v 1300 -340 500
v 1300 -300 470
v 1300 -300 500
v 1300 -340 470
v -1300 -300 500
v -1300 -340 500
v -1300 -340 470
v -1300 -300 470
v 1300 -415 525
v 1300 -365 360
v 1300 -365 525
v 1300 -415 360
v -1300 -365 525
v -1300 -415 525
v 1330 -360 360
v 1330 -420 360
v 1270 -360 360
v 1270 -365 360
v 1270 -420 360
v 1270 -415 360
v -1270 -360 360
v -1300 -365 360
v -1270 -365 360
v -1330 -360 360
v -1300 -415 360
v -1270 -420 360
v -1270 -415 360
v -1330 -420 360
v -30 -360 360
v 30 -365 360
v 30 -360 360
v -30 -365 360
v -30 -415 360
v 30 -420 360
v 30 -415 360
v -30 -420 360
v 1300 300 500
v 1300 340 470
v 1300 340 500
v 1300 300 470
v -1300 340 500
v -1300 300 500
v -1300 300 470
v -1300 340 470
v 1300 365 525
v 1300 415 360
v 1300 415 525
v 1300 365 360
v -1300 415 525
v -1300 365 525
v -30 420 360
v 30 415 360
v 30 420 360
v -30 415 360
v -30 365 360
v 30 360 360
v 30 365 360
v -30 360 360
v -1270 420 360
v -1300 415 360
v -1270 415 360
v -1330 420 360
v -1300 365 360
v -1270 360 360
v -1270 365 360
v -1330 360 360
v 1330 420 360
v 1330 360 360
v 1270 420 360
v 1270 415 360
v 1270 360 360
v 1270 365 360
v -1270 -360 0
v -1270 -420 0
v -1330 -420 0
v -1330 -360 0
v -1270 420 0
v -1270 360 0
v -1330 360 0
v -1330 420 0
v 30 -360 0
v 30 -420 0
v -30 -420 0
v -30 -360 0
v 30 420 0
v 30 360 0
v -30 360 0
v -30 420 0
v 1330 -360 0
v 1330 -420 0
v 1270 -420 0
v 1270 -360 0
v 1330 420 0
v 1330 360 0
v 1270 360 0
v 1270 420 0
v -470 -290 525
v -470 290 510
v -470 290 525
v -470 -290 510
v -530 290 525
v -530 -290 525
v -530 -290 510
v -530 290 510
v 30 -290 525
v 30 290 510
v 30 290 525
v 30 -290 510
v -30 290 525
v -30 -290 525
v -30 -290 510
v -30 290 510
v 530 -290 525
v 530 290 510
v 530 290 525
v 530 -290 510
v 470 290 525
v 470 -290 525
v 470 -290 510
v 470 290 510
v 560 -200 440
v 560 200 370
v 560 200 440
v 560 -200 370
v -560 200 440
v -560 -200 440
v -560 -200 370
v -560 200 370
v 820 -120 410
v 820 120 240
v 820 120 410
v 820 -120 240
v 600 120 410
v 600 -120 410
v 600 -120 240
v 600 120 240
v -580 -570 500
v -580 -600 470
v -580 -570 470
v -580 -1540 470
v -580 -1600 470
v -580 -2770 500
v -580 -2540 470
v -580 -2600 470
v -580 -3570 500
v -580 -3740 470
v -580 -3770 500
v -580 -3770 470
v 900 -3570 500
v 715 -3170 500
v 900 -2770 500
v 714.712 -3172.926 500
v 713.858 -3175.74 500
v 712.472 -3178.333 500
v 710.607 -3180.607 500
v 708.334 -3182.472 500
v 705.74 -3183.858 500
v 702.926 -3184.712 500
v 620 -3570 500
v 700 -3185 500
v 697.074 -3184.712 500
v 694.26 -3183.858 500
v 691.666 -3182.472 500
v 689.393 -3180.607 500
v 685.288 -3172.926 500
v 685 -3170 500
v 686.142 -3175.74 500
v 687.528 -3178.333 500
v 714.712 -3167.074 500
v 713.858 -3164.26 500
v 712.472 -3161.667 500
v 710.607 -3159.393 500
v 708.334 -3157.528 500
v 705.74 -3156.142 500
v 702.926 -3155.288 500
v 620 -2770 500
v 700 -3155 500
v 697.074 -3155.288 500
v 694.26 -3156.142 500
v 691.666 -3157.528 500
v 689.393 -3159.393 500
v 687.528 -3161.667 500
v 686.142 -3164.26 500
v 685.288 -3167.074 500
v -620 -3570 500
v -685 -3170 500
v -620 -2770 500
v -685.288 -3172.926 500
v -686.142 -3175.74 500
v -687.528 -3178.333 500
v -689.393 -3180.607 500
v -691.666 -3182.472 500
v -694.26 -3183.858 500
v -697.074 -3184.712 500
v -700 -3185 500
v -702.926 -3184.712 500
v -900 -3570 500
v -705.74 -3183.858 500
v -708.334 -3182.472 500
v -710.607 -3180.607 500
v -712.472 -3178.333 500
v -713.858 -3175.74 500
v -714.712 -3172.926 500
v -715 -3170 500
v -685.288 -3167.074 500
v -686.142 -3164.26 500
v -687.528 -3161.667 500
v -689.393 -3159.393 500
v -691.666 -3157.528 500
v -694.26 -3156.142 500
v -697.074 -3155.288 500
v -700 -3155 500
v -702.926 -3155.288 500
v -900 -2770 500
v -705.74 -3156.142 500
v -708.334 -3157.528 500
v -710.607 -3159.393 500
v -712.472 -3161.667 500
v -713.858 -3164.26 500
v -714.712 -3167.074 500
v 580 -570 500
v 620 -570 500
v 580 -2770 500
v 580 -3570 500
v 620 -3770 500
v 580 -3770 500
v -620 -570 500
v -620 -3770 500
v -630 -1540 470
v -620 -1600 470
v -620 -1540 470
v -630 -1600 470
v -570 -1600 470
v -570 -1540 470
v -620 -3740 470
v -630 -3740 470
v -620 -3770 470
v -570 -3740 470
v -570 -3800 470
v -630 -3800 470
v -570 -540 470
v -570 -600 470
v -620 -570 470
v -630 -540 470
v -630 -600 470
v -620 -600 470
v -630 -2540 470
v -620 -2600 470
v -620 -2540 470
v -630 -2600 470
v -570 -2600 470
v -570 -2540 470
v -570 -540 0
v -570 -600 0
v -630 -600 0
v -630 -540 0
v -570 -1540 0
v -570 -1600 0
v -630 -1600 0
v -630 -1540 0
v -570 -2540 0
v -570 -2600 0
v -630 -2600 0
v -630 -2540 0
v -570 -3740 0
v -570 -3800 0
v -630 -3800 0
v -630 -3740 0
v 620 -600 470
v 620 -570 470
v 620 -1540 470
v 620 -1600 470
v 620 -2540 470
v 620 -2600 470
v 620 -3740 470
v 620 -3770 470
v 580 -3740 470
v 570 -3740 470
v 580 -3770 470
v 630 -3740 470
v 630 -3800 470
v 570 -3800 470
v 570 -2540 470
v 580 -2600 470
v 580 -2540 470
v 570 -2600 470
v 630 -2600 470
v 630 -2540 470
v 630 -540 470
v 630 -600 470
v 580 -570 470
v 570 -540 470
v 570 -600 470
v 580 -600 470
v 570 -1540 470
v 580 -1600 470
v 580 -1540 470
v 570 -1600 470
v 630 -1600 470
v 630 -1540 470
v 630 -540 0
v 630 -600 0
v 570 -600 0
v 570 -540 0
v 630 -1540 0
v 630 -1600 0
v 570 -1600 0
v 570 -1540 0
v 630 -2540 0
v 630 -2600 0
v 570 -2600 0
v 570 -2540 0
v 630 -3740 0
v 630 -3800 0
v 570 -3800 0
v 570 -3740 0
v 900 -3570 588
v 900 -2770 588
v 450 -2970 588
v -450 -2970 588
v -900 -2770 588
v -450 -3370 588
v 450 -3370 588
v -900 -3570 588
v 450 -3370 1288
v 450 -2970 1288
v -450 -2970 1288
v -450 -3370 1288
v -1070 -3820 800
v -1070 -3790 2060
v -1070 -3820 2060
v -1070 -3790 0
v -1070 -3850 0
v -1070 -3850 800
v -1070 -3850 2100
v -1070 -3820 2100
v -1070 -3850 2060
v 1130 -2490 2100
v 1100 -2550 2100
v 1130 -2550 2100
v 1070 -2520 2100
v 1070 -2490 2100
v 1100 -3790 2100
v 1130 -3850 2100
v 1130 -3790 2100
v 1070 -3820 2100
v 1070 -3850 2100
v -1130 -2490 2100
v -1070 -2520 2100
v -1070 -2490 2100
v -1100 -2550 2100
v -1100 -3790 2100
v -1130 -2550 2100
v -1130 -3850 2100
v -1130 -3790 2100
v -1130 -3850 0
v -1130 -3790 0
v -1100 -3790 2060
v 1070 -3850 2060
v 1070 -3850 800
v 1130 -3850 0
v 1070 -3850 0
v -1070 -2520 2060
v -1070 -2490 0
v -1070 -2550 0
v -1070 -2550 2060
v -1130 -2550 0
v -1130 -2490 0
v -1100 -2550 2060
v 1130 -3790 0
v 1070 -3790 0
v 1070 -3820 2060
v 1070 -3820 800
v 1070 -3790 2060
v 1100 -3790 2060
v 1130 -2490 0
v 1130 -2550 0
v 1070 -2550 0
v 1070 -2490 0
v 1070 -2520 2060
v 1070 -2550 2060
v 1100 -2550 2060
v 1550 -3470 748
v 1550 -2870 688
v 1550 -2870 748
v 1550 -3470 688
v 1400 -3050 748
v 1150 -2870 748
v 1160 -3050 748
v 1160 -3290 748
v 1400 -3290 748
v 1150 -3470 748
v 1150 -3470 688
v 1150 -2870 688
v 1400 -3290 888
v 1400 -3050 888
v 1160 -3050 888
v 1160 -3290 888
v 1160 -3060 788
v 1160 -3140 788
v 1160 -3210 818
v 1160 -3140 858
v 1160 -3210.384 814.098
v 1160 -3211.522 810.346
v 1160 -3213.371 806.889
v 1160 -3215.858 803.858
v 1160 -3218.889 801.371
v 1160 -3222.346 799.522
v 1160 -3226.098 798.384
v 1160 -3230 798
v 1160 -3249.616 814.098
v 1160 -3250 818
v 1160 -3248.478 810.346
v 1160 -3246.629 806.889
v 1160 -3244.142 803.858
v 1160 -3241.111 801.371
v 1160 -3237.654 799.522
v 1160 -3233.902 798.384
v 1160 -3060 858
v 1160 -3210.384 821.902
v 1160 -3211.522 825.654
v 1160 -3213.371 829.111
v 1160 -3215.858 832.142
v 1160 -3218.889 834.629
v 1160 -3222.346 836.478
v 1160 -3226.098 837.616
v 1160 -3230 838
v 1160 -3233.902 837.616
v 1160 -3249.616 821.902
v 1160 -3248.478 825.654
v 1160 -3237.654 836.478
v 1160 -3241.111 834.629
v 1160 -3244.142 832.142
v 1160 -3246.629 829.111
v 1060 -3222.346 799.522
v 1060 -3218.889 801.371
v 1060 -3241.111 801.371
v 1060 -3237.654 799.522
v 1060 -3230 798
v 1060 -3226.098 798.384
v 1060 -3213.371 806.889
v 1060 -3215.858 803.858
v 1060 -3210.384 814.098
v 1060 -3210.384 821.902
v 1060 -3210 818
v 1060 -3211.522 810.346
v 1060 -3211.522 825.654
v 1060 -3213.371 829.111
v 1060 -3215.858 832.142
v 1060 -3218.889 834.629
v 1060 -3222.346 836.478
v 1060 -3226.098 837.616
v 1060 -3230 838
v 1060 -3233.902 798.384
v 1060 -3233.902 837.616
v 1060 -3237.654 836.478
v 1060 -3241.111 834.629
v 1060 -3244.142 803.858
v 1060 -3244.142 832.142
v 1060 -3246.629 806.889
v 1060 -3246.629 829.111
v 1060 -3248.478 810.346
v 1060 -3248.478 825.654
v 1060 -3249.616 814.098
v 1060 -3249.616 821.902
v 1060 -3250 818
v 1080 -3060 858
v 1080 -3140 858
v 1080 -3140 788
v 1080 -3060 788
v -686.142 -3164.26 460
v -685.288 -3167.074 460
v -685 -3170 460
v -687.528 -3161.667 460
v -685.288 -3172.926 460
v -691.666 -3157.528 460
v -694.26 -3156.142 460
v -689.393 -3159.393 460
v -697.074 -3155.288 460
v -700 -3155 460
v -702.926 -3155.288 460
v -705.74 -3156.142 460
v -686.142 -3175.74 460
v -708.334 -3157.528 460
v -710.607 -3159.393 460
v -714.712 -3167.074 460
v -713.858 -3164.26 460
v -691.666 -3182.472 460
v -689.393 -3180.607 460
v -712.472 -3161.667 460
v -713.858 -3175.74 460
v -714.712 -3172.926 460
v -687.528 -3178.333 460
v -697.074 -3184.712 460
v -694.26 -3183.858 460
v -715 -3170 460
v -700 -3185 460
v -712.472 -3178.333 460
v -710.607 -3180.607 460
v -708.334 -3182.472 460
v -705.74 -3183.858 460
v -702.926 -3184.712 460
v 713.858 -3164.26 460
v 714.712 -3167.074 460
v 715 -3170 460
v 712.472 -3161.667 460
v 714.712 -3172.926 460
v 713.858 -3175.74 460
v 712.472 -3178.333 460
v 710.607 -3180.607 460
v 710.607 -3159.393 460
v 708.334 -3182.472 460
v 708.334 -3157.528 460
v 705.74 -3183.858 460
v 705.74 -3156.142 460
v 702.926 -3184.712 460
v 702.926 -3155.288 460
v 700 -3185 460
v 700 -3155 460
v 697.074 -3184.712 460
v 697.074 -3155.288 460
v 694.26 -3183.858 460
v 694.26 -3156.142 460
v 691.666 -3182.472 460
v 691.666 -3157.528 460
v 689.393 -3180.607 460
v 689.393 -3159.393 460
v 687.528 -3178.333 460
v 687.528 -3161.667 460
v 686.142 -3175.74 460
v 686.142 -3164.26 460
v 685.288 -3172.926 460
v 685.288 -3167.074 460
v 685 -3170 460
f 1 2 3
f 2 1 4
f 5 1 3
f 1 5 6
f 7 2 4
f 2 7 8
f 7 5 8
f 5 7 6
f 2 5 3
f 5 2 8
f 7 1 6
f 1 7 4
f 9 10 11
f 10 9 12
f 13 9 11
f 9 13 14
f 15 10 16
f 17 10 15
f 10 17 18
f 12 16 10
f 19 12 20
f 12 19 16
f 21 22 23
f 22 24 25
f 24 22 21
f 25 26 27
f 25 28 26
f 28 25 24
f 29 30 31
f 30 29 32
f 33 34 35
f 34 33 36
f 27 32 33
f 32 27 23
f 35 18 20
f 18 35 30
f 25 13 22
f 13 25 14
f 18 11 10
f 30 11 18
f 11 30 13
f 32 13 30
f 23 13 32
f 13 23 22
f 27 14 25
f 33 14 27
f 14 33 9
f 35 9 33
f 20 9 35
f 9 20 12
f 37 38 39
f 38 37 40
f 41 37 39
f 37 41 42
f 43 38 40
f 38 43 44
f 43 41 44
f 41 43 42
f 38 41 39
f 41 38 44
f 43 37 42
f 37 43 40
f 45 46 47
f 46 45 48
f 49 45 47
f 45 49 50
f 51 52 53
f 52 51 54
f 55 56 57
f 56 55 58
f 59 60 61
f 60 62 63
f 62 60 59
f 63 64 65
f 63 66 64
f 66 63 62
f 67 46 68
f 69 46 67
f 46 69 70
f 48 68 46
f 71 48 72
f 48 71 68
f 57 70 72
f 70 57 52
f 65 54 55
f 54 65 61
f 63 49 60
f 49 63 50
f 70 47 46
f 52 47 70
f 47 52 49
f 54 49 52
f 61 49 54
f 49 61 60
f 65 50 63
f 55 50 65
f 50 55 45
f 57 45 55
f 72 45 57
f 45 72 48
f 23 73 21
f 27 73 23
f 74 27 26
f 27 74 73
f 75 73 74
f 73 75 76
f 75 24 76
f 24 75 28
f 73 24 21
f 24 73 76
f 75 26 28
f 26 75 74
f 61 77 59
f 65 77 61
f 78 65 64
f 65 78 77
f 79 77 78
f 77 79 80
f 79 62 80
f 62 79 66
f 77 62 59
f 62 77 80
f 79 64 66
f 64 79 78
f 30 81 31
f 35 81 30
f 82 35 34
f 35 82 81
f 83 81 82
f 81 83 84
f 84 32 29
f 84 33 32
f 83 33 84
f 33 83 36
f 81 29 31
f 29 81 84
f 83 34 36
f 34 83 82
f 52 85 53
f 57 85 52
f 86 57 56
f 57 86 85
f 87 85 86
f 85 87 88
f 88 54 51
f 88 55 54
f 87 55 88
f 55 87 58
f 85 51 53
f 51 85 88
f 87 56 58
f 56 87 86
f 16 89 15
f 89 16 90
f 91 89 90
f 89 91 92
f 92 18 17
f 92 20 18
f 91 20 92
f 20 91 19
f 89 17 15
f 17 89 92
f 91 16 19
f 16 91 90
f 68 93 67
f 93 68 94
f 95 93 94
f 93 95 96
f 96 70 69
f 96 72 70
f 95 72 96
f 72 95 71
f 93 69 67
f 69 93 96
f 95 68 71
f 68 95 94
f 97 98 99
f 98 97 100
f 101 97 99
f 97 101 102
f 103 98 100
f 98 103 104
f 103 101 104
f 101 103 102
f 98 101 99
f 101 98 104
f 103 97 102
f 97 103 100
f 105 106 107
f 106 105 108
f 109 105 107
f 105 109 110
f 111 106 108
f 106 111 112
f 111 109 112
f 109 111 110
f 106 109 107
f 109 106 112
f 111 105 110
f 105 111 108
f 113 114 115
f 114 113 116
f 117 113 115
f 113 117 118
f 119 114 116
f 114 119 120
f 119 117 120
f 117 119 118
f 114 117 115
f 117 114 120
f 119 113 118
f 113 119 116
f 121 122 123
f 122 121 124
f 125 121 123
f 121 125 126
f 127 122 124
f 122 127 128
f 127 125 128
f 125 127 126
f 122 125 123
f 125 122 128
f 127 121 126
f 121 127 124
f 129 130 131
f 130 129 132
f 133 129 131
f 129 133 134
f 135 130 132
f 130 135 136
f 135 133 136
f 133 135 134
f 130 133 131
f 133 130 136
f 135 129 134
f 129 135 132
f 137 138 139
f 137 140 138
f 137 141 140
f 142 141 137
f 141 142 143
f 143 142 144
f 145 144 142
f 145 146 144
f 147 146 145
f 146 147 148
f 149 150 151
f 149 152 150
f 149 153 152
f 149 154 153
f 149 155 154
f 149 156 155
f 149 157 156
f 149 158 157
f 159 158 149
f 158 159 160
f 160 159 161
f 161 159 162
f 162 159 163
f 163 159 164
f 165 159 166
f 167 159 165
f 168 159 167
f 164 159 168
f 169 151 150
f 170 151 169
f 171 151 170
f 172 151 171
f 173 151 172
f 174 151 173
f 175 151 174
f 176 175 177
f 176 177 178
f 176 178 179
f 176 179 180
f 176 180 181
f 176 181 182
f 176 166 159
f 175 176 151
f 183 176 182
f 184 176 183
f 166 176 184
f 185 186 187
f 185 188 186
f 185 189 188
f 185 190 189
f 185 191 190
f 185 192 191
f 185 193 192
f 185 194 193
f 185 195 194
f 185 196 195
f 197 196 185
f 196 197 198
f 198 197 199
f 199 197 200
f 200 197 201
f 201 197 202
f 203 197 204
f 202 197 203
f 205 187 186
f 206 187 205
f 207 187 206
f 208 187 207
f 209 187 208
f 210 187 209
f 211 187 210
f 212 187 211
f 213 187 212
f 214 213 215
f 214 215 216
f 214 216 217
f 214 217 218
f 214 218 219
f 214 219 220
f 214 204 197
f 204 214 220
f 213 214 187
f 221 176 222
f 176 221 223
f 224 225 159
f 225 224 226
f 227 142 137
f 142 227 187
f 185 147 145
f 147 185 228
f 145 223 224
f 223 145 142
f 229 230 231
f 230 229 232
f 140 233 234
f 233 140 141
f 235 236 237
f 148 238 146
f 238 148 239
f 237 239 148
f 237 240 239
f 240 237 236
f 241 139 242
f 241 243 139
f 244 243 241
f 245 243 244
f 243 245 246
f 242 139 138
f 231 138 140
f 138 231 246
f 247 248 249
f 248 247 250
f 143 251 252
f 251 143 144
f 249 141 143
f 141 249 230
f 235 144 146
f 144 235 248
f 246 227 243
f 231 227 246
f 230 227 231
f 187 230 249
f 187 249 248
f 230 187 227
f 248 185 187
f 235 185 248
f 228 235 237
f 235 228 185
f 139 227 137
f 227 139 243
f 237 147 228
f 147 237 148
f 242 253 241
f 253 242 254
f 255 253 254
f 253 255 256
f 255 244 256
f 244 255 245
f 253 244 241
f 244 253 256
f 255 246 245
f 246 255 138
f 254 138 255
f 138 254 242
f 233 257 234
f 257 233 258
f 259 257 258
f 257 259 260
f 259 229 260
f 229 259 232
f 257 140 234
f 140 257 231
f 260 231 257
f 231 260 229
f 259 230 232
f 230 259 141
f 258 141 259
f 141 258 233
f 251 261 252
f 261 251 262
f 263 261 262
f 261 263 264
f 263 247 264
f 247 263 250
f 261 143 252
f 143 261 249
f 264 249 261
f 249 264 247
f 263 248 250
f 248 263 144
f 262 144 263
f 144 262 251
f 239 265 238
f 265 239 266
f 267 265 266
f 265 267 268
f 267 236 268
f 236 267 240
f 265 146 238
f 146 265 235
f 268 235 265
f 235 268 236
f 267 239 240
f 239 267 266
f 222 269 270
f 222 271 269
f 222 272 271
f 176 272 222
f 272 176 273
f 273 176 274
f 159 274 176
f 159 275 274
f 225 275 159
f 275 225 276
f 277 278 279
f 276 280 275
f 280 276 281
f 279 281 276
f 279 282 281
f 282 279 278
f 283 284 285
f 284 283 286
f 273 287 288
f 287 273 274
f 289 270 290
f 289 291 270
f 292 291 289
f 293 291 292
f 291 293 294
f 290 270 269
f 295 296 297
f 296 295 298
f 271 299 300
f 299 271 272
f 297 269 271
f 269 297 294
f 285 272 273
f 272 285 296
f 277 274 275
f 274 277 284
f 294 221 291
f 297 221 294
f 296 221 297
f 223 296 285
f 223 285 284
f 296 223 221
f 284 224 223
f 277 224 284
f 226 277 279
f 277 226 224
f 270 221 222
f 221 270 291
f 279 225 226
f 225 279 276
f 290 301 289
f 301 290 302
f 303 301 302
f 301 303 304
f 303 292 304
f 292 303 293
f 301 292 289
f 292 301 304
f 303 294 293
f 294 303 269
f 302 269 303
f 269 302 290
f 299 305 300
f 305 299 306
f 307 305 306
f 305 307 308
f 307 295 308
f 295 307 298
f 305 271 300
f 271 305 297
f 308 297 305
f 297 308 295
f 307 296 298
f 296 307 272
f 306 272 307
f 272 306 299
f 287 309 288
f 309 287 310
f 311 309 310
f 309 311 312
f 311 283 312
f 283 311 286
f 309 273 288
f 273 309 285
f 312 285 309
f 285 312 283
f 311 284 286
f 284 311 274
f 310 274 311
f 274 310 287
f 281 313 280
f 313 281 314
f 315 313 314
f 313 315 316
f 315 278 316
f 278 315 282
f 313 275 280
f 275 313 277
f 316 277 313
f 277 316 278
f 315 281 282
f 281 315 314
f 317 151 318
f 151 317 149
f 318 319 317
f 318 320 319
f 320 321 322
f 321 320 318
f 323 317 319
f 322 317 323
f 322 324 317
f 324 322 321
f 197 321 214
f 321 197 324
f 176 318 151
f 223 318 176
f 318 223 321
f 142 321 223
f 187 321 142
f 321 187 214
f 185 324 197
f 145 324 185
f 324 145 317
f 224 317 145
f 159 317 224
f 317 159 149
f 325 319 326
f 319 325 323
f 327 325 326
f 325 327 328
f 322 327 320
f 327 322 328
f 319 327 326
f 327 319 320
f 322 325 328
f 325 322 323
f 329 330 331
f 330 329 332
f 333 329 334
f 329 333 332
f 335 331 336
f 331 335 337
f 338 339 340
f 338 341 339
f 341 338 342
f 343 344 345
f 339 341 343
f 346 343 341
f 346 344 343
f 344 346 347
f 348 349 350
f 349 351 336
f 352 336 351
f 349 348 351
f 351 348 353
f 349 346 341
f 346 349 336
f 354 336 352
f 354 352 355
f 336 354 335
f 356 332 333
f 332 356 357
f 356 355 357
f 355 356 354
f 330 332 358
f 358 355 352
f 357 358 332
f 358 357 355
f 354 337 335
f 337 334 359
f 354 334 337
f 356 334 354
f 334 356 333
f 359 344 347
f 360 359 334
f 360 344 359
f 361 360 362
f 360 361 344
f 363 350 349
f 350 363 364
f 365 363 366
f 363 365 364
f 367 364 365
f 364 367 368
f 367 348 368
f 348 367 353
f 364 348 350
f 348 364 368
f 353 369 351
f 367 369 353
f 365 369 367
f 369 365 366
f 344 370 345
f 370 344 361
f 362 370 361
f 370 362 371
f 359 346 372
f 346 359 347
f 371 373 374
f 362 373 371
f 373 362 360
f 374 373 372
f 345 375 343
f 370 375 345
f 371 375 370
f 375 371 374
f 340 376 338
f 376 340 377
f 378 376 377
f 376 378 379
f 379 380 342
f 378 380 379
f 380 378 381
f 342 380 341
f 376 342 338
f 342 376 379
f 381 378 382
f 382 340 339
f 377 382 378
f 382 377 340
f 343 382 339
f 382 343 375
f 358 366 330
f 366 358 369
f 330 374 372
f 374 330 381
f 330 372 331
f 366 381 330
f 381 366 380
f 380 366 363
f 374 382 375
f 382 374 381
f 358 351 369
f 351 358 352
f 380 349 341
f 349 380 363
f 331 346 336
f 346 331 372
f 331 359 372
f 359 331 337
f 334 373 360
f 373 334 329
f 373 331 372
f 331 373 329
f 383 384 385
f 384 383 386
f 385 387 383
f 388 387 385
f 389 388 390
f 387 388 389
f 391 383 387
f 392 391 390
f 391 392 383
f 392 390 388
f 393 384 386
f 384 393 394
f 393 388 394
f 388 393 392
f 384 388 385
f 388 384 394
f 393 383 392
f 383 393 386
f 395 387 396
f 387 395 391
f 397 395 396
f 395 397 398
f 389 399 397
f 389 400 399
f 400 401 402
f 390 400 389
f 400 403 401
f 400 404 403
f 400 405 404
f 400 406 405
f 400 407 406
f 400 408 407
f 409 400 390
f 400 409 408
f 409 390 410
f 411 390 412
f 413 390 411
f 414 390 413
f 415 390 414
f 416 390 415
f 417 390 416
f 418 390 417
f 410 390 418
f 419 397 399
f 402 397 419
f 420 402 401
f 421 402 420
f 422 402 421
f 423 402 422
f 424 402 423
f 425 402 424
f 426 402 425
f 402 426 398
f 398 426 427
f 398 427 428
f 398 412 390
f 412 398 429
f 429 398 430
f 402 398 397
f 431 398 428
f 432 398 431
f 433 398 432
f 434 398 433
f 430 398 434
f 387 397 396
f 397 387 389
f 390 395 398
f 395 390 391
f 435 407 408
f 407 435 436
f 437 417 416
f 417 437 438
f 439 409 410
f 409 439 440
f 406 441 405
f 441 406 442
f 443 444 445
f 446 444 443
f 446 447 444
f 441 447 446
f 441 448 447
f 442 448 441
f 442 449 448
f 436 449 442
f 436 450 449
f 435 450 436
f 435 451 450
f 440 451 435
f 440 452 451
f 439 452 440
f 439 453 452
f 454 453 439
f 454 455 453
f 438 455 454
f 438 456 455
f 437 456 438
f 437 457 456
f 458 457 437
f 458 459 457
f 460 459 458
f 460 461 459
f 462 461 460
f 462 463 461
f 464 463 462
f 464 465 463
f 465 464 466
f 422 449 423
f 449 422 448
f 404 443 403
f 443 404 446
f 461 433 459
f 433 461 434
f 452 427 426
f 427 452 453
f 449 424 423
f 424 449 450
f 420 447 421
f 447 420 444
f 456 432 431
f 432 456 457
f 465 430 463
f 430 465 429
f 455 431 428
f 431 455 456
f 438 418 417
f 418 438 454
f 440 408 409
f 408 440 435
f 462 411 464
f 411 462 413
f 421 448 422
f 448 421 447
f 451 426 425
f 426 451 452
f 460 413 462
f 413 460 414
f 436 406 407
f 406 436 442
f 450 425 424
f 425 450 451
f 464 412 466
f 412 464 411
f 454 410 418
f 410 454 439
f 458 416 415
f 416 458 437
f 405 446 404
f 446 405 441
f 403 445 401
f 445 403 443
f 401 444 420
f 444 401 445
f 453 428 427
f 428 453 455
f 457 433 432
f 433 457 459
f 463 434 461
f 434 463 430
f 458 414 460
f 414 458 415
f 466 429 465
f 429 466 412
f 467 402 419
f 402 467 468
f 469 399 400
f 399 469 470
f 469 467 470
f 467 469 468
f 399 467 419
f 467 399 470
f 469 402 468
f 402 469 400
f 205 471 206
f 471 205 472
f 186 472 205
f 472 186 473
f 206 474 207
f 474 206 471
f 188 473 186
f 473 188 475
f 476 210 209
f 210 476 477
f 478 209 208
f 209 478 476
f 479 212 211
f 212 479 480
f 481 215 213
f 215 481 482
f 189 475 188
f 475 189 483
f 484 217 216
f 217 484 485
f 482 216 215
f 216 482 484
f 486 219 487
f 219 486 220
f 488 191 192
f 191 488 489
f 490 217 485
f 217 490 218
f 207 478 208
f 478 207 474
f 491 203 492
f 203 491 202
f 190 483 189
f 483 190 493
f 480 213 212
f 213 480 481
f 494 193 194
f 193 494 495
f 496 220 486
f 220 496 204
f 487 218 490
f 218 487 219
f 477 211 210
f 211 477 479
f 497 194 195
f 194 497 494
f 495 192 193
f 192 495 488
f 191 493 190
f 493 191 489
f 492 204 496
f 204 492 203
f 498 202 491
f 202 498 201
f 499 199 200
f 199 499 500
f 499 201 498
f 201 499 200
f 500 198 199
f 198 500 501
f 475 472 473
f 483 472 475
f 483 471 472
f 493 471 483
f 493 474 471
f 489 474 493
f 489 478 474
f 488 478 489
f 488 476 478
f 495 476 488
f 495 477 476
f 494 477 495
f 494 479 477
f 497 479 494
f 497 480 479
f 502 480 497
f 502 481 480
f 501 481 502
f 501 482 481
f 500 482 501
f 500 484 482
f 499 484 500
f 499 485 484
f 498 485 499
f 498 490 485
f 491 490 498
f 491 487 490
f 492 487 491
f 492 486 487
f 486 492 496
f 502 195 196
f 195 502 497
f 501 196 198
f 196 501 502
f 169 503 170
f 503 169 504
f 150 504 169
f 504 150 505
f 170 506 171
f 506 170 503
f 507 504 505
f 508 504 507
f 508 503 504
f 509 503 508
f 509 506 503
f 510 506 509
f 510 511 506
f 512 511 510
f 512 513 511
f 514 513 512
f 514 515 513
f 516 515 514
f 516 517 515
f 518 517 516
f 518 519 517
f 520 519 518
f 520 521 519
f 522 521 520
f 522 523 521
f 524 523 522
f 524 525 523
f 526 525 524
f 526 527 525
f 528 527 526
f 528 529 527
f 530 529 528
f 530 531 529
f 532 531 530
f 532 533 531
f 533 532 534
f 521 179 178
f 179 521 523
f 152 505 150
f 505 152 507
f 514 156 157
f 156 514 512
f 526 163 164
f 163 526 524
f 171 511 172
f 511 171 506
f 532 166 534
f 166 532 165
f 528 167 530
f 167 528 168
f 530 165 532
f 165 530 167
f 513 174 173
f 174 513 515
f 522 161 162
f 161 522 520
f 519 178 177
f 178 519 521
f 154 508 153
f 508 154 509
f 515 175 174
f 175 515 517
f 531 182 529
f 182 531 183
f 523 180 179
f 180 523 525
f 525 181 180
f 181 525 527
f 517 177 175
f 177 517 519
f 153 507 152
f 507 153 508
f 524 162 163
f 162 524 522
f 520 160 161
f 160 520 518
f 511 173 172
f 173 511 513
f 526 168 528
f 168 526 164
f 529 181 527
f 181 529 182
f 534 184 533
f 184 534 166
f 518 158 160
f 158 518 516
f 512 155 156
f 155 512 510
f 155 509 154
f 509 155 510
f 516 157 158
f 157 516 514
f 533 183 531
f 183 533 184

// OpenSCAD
// test_spur - generated by asm_3d.py from out/assembly/assembly_specs.json (F4.4) - units mm
// DESIGN - check and release before manufacture. z up, conveyor top z = 500.

module test_spur() {
  translate([-1300.00, -340.00, 470.00]) cube([2600.00, 40.00, 30.00]);
  translate([-1300.00, -415.00, 360.00]) cube([2600.00, 50.00, 165.00]);
  translate([-1300.00, 300.00, 470.00]) cube([2600.00, 40.00, 30.00]);
  translate([-1300.00, 365.00, 360.00]) cube([2600.00, 50.00, 165.00]);
  translate([-1330.00, -420.00, 0.00]) cube([60.00, 60.00, 360.00]);
  translate([-1330.00, 360.00, 0.00]) cube([60.00, 60.00, 360.00]);
  translate([-30.00, -420.00, 0.00]) cube([60.00, 60.00, 360.00]);
  translate([-30.00, 360.00, 0.00]) cube([60.00, 60.00, 360.00]);
  translate([1270.00, -420.00, 0.00]) cube([60.00, 60.00, 360.00]);
  translate([1270.00, 360.00, 0.00]) cube([60.00, 60.00, 360.00]);
  translate([-530.00, -290.00, 510.00]) cube([60.00, 580.00, 15.00]);
  translate([-30.00, -290.00, 510.00]) cube([60.00, 580.00, 15.00]);
  translate([470.00, -290.00, 510.00]) cube([60.00, 580.00, 15.00]);
  translate([-560.00, -200.00, 370.00]) cube([1120.00, 400.00, 70.00]);
  translate([600.00, -120.00, 240.00]) cube([220.00, 240.00, 170.00]);
  translate([-620.00, -3770.00, 470.00]) cube([40.00, 3200.00, 30.00]);
  translate([-630.00, -600.00, 0.00]) cube([60.00, 60.00, 470.00]);
  translate([-630.00, -1600.00, 0.00]) cube([60.00, 60.00, 470.00]);
  translate([-630.00, -2600.00, 0.00]) cube([60.00, 60.00, 470.00]);
  translate([-630.00, -3800.00, 0.00]) cube([60.00, 60.00, 470.00]);
  translate([580.00, -3770.00, 470.00]) cube([40.00, 3200.00, 30.00]);
  translate([570.00, -600.00, 0.00]) cube([60.00, 60.00, 470.00]);
  translate([570.00, -1600.00, 0.00]) cube([60.00, 60.00, 470.00]);
  translate([570.00, -2600.00, 0.00]) cube([60.00, 60.00, 470.00]);
  translate([570.00, -3800.00, 0.00]) cube([60.00, 60.00, 470.00]);
  translate([-900.00, -3570.00, 500.00]) cube([1800.00, 800.00, 88.00]);
  translate([-450.00, -3370.00, 588.00]) cube([900.00, 400.00, 700.00]);
  translate([-1130.00, -3850.00, 0.00]) cube([60.00, 60.00, 2100.00]);
  translate([-1130.00, -2550.00, 0.00]) cube([60.00, 60.00, 2100.00]);
  translate([1070.00, -3850.00, 0.00]) cube([60.00, 60.00, 2100.00]);
  translate([1070.00, -2550.00, 0.00]) cube([60.00, 60.00, 2100.00]);
  translate([-1100.00, -3820.00, 2060.00]) cube([2200.00, 1300.00, 40.00]);
  translate([-1100.00, -3850.00, 800.00]) cube([2200.00, 30.00, 1260.00]);
  translate([1150.00, -3470.00, 688.00]) cube([400.00, 600.00, 60.00]);
  translate([1160.00, -3290.00, 748.00]) cube([240.00, 240.00, 140.00]);
  translate([1120.00, -3230.00, 818.00]) rotate([0, 90, 0]) cylinder(r = 20.00, h = 120.00, center = true, $fn = 32);
  translate([1080.00, -3140.00, 788.00]) cube([80.00, 80.00, 70.00]);
  translate([-700.00, -3170.00, 480.00]) rotate([0, 0, 0]) cylinder(r = 15.00, h = 40.00, center = true, $fn = 32);
  translate([700.00, -3170.00, 480.00]) rotate([0, 0, 0]) cylinder(r = 15.00, h = 40.00, center = true, $fn = 32);
}
test_spur();
